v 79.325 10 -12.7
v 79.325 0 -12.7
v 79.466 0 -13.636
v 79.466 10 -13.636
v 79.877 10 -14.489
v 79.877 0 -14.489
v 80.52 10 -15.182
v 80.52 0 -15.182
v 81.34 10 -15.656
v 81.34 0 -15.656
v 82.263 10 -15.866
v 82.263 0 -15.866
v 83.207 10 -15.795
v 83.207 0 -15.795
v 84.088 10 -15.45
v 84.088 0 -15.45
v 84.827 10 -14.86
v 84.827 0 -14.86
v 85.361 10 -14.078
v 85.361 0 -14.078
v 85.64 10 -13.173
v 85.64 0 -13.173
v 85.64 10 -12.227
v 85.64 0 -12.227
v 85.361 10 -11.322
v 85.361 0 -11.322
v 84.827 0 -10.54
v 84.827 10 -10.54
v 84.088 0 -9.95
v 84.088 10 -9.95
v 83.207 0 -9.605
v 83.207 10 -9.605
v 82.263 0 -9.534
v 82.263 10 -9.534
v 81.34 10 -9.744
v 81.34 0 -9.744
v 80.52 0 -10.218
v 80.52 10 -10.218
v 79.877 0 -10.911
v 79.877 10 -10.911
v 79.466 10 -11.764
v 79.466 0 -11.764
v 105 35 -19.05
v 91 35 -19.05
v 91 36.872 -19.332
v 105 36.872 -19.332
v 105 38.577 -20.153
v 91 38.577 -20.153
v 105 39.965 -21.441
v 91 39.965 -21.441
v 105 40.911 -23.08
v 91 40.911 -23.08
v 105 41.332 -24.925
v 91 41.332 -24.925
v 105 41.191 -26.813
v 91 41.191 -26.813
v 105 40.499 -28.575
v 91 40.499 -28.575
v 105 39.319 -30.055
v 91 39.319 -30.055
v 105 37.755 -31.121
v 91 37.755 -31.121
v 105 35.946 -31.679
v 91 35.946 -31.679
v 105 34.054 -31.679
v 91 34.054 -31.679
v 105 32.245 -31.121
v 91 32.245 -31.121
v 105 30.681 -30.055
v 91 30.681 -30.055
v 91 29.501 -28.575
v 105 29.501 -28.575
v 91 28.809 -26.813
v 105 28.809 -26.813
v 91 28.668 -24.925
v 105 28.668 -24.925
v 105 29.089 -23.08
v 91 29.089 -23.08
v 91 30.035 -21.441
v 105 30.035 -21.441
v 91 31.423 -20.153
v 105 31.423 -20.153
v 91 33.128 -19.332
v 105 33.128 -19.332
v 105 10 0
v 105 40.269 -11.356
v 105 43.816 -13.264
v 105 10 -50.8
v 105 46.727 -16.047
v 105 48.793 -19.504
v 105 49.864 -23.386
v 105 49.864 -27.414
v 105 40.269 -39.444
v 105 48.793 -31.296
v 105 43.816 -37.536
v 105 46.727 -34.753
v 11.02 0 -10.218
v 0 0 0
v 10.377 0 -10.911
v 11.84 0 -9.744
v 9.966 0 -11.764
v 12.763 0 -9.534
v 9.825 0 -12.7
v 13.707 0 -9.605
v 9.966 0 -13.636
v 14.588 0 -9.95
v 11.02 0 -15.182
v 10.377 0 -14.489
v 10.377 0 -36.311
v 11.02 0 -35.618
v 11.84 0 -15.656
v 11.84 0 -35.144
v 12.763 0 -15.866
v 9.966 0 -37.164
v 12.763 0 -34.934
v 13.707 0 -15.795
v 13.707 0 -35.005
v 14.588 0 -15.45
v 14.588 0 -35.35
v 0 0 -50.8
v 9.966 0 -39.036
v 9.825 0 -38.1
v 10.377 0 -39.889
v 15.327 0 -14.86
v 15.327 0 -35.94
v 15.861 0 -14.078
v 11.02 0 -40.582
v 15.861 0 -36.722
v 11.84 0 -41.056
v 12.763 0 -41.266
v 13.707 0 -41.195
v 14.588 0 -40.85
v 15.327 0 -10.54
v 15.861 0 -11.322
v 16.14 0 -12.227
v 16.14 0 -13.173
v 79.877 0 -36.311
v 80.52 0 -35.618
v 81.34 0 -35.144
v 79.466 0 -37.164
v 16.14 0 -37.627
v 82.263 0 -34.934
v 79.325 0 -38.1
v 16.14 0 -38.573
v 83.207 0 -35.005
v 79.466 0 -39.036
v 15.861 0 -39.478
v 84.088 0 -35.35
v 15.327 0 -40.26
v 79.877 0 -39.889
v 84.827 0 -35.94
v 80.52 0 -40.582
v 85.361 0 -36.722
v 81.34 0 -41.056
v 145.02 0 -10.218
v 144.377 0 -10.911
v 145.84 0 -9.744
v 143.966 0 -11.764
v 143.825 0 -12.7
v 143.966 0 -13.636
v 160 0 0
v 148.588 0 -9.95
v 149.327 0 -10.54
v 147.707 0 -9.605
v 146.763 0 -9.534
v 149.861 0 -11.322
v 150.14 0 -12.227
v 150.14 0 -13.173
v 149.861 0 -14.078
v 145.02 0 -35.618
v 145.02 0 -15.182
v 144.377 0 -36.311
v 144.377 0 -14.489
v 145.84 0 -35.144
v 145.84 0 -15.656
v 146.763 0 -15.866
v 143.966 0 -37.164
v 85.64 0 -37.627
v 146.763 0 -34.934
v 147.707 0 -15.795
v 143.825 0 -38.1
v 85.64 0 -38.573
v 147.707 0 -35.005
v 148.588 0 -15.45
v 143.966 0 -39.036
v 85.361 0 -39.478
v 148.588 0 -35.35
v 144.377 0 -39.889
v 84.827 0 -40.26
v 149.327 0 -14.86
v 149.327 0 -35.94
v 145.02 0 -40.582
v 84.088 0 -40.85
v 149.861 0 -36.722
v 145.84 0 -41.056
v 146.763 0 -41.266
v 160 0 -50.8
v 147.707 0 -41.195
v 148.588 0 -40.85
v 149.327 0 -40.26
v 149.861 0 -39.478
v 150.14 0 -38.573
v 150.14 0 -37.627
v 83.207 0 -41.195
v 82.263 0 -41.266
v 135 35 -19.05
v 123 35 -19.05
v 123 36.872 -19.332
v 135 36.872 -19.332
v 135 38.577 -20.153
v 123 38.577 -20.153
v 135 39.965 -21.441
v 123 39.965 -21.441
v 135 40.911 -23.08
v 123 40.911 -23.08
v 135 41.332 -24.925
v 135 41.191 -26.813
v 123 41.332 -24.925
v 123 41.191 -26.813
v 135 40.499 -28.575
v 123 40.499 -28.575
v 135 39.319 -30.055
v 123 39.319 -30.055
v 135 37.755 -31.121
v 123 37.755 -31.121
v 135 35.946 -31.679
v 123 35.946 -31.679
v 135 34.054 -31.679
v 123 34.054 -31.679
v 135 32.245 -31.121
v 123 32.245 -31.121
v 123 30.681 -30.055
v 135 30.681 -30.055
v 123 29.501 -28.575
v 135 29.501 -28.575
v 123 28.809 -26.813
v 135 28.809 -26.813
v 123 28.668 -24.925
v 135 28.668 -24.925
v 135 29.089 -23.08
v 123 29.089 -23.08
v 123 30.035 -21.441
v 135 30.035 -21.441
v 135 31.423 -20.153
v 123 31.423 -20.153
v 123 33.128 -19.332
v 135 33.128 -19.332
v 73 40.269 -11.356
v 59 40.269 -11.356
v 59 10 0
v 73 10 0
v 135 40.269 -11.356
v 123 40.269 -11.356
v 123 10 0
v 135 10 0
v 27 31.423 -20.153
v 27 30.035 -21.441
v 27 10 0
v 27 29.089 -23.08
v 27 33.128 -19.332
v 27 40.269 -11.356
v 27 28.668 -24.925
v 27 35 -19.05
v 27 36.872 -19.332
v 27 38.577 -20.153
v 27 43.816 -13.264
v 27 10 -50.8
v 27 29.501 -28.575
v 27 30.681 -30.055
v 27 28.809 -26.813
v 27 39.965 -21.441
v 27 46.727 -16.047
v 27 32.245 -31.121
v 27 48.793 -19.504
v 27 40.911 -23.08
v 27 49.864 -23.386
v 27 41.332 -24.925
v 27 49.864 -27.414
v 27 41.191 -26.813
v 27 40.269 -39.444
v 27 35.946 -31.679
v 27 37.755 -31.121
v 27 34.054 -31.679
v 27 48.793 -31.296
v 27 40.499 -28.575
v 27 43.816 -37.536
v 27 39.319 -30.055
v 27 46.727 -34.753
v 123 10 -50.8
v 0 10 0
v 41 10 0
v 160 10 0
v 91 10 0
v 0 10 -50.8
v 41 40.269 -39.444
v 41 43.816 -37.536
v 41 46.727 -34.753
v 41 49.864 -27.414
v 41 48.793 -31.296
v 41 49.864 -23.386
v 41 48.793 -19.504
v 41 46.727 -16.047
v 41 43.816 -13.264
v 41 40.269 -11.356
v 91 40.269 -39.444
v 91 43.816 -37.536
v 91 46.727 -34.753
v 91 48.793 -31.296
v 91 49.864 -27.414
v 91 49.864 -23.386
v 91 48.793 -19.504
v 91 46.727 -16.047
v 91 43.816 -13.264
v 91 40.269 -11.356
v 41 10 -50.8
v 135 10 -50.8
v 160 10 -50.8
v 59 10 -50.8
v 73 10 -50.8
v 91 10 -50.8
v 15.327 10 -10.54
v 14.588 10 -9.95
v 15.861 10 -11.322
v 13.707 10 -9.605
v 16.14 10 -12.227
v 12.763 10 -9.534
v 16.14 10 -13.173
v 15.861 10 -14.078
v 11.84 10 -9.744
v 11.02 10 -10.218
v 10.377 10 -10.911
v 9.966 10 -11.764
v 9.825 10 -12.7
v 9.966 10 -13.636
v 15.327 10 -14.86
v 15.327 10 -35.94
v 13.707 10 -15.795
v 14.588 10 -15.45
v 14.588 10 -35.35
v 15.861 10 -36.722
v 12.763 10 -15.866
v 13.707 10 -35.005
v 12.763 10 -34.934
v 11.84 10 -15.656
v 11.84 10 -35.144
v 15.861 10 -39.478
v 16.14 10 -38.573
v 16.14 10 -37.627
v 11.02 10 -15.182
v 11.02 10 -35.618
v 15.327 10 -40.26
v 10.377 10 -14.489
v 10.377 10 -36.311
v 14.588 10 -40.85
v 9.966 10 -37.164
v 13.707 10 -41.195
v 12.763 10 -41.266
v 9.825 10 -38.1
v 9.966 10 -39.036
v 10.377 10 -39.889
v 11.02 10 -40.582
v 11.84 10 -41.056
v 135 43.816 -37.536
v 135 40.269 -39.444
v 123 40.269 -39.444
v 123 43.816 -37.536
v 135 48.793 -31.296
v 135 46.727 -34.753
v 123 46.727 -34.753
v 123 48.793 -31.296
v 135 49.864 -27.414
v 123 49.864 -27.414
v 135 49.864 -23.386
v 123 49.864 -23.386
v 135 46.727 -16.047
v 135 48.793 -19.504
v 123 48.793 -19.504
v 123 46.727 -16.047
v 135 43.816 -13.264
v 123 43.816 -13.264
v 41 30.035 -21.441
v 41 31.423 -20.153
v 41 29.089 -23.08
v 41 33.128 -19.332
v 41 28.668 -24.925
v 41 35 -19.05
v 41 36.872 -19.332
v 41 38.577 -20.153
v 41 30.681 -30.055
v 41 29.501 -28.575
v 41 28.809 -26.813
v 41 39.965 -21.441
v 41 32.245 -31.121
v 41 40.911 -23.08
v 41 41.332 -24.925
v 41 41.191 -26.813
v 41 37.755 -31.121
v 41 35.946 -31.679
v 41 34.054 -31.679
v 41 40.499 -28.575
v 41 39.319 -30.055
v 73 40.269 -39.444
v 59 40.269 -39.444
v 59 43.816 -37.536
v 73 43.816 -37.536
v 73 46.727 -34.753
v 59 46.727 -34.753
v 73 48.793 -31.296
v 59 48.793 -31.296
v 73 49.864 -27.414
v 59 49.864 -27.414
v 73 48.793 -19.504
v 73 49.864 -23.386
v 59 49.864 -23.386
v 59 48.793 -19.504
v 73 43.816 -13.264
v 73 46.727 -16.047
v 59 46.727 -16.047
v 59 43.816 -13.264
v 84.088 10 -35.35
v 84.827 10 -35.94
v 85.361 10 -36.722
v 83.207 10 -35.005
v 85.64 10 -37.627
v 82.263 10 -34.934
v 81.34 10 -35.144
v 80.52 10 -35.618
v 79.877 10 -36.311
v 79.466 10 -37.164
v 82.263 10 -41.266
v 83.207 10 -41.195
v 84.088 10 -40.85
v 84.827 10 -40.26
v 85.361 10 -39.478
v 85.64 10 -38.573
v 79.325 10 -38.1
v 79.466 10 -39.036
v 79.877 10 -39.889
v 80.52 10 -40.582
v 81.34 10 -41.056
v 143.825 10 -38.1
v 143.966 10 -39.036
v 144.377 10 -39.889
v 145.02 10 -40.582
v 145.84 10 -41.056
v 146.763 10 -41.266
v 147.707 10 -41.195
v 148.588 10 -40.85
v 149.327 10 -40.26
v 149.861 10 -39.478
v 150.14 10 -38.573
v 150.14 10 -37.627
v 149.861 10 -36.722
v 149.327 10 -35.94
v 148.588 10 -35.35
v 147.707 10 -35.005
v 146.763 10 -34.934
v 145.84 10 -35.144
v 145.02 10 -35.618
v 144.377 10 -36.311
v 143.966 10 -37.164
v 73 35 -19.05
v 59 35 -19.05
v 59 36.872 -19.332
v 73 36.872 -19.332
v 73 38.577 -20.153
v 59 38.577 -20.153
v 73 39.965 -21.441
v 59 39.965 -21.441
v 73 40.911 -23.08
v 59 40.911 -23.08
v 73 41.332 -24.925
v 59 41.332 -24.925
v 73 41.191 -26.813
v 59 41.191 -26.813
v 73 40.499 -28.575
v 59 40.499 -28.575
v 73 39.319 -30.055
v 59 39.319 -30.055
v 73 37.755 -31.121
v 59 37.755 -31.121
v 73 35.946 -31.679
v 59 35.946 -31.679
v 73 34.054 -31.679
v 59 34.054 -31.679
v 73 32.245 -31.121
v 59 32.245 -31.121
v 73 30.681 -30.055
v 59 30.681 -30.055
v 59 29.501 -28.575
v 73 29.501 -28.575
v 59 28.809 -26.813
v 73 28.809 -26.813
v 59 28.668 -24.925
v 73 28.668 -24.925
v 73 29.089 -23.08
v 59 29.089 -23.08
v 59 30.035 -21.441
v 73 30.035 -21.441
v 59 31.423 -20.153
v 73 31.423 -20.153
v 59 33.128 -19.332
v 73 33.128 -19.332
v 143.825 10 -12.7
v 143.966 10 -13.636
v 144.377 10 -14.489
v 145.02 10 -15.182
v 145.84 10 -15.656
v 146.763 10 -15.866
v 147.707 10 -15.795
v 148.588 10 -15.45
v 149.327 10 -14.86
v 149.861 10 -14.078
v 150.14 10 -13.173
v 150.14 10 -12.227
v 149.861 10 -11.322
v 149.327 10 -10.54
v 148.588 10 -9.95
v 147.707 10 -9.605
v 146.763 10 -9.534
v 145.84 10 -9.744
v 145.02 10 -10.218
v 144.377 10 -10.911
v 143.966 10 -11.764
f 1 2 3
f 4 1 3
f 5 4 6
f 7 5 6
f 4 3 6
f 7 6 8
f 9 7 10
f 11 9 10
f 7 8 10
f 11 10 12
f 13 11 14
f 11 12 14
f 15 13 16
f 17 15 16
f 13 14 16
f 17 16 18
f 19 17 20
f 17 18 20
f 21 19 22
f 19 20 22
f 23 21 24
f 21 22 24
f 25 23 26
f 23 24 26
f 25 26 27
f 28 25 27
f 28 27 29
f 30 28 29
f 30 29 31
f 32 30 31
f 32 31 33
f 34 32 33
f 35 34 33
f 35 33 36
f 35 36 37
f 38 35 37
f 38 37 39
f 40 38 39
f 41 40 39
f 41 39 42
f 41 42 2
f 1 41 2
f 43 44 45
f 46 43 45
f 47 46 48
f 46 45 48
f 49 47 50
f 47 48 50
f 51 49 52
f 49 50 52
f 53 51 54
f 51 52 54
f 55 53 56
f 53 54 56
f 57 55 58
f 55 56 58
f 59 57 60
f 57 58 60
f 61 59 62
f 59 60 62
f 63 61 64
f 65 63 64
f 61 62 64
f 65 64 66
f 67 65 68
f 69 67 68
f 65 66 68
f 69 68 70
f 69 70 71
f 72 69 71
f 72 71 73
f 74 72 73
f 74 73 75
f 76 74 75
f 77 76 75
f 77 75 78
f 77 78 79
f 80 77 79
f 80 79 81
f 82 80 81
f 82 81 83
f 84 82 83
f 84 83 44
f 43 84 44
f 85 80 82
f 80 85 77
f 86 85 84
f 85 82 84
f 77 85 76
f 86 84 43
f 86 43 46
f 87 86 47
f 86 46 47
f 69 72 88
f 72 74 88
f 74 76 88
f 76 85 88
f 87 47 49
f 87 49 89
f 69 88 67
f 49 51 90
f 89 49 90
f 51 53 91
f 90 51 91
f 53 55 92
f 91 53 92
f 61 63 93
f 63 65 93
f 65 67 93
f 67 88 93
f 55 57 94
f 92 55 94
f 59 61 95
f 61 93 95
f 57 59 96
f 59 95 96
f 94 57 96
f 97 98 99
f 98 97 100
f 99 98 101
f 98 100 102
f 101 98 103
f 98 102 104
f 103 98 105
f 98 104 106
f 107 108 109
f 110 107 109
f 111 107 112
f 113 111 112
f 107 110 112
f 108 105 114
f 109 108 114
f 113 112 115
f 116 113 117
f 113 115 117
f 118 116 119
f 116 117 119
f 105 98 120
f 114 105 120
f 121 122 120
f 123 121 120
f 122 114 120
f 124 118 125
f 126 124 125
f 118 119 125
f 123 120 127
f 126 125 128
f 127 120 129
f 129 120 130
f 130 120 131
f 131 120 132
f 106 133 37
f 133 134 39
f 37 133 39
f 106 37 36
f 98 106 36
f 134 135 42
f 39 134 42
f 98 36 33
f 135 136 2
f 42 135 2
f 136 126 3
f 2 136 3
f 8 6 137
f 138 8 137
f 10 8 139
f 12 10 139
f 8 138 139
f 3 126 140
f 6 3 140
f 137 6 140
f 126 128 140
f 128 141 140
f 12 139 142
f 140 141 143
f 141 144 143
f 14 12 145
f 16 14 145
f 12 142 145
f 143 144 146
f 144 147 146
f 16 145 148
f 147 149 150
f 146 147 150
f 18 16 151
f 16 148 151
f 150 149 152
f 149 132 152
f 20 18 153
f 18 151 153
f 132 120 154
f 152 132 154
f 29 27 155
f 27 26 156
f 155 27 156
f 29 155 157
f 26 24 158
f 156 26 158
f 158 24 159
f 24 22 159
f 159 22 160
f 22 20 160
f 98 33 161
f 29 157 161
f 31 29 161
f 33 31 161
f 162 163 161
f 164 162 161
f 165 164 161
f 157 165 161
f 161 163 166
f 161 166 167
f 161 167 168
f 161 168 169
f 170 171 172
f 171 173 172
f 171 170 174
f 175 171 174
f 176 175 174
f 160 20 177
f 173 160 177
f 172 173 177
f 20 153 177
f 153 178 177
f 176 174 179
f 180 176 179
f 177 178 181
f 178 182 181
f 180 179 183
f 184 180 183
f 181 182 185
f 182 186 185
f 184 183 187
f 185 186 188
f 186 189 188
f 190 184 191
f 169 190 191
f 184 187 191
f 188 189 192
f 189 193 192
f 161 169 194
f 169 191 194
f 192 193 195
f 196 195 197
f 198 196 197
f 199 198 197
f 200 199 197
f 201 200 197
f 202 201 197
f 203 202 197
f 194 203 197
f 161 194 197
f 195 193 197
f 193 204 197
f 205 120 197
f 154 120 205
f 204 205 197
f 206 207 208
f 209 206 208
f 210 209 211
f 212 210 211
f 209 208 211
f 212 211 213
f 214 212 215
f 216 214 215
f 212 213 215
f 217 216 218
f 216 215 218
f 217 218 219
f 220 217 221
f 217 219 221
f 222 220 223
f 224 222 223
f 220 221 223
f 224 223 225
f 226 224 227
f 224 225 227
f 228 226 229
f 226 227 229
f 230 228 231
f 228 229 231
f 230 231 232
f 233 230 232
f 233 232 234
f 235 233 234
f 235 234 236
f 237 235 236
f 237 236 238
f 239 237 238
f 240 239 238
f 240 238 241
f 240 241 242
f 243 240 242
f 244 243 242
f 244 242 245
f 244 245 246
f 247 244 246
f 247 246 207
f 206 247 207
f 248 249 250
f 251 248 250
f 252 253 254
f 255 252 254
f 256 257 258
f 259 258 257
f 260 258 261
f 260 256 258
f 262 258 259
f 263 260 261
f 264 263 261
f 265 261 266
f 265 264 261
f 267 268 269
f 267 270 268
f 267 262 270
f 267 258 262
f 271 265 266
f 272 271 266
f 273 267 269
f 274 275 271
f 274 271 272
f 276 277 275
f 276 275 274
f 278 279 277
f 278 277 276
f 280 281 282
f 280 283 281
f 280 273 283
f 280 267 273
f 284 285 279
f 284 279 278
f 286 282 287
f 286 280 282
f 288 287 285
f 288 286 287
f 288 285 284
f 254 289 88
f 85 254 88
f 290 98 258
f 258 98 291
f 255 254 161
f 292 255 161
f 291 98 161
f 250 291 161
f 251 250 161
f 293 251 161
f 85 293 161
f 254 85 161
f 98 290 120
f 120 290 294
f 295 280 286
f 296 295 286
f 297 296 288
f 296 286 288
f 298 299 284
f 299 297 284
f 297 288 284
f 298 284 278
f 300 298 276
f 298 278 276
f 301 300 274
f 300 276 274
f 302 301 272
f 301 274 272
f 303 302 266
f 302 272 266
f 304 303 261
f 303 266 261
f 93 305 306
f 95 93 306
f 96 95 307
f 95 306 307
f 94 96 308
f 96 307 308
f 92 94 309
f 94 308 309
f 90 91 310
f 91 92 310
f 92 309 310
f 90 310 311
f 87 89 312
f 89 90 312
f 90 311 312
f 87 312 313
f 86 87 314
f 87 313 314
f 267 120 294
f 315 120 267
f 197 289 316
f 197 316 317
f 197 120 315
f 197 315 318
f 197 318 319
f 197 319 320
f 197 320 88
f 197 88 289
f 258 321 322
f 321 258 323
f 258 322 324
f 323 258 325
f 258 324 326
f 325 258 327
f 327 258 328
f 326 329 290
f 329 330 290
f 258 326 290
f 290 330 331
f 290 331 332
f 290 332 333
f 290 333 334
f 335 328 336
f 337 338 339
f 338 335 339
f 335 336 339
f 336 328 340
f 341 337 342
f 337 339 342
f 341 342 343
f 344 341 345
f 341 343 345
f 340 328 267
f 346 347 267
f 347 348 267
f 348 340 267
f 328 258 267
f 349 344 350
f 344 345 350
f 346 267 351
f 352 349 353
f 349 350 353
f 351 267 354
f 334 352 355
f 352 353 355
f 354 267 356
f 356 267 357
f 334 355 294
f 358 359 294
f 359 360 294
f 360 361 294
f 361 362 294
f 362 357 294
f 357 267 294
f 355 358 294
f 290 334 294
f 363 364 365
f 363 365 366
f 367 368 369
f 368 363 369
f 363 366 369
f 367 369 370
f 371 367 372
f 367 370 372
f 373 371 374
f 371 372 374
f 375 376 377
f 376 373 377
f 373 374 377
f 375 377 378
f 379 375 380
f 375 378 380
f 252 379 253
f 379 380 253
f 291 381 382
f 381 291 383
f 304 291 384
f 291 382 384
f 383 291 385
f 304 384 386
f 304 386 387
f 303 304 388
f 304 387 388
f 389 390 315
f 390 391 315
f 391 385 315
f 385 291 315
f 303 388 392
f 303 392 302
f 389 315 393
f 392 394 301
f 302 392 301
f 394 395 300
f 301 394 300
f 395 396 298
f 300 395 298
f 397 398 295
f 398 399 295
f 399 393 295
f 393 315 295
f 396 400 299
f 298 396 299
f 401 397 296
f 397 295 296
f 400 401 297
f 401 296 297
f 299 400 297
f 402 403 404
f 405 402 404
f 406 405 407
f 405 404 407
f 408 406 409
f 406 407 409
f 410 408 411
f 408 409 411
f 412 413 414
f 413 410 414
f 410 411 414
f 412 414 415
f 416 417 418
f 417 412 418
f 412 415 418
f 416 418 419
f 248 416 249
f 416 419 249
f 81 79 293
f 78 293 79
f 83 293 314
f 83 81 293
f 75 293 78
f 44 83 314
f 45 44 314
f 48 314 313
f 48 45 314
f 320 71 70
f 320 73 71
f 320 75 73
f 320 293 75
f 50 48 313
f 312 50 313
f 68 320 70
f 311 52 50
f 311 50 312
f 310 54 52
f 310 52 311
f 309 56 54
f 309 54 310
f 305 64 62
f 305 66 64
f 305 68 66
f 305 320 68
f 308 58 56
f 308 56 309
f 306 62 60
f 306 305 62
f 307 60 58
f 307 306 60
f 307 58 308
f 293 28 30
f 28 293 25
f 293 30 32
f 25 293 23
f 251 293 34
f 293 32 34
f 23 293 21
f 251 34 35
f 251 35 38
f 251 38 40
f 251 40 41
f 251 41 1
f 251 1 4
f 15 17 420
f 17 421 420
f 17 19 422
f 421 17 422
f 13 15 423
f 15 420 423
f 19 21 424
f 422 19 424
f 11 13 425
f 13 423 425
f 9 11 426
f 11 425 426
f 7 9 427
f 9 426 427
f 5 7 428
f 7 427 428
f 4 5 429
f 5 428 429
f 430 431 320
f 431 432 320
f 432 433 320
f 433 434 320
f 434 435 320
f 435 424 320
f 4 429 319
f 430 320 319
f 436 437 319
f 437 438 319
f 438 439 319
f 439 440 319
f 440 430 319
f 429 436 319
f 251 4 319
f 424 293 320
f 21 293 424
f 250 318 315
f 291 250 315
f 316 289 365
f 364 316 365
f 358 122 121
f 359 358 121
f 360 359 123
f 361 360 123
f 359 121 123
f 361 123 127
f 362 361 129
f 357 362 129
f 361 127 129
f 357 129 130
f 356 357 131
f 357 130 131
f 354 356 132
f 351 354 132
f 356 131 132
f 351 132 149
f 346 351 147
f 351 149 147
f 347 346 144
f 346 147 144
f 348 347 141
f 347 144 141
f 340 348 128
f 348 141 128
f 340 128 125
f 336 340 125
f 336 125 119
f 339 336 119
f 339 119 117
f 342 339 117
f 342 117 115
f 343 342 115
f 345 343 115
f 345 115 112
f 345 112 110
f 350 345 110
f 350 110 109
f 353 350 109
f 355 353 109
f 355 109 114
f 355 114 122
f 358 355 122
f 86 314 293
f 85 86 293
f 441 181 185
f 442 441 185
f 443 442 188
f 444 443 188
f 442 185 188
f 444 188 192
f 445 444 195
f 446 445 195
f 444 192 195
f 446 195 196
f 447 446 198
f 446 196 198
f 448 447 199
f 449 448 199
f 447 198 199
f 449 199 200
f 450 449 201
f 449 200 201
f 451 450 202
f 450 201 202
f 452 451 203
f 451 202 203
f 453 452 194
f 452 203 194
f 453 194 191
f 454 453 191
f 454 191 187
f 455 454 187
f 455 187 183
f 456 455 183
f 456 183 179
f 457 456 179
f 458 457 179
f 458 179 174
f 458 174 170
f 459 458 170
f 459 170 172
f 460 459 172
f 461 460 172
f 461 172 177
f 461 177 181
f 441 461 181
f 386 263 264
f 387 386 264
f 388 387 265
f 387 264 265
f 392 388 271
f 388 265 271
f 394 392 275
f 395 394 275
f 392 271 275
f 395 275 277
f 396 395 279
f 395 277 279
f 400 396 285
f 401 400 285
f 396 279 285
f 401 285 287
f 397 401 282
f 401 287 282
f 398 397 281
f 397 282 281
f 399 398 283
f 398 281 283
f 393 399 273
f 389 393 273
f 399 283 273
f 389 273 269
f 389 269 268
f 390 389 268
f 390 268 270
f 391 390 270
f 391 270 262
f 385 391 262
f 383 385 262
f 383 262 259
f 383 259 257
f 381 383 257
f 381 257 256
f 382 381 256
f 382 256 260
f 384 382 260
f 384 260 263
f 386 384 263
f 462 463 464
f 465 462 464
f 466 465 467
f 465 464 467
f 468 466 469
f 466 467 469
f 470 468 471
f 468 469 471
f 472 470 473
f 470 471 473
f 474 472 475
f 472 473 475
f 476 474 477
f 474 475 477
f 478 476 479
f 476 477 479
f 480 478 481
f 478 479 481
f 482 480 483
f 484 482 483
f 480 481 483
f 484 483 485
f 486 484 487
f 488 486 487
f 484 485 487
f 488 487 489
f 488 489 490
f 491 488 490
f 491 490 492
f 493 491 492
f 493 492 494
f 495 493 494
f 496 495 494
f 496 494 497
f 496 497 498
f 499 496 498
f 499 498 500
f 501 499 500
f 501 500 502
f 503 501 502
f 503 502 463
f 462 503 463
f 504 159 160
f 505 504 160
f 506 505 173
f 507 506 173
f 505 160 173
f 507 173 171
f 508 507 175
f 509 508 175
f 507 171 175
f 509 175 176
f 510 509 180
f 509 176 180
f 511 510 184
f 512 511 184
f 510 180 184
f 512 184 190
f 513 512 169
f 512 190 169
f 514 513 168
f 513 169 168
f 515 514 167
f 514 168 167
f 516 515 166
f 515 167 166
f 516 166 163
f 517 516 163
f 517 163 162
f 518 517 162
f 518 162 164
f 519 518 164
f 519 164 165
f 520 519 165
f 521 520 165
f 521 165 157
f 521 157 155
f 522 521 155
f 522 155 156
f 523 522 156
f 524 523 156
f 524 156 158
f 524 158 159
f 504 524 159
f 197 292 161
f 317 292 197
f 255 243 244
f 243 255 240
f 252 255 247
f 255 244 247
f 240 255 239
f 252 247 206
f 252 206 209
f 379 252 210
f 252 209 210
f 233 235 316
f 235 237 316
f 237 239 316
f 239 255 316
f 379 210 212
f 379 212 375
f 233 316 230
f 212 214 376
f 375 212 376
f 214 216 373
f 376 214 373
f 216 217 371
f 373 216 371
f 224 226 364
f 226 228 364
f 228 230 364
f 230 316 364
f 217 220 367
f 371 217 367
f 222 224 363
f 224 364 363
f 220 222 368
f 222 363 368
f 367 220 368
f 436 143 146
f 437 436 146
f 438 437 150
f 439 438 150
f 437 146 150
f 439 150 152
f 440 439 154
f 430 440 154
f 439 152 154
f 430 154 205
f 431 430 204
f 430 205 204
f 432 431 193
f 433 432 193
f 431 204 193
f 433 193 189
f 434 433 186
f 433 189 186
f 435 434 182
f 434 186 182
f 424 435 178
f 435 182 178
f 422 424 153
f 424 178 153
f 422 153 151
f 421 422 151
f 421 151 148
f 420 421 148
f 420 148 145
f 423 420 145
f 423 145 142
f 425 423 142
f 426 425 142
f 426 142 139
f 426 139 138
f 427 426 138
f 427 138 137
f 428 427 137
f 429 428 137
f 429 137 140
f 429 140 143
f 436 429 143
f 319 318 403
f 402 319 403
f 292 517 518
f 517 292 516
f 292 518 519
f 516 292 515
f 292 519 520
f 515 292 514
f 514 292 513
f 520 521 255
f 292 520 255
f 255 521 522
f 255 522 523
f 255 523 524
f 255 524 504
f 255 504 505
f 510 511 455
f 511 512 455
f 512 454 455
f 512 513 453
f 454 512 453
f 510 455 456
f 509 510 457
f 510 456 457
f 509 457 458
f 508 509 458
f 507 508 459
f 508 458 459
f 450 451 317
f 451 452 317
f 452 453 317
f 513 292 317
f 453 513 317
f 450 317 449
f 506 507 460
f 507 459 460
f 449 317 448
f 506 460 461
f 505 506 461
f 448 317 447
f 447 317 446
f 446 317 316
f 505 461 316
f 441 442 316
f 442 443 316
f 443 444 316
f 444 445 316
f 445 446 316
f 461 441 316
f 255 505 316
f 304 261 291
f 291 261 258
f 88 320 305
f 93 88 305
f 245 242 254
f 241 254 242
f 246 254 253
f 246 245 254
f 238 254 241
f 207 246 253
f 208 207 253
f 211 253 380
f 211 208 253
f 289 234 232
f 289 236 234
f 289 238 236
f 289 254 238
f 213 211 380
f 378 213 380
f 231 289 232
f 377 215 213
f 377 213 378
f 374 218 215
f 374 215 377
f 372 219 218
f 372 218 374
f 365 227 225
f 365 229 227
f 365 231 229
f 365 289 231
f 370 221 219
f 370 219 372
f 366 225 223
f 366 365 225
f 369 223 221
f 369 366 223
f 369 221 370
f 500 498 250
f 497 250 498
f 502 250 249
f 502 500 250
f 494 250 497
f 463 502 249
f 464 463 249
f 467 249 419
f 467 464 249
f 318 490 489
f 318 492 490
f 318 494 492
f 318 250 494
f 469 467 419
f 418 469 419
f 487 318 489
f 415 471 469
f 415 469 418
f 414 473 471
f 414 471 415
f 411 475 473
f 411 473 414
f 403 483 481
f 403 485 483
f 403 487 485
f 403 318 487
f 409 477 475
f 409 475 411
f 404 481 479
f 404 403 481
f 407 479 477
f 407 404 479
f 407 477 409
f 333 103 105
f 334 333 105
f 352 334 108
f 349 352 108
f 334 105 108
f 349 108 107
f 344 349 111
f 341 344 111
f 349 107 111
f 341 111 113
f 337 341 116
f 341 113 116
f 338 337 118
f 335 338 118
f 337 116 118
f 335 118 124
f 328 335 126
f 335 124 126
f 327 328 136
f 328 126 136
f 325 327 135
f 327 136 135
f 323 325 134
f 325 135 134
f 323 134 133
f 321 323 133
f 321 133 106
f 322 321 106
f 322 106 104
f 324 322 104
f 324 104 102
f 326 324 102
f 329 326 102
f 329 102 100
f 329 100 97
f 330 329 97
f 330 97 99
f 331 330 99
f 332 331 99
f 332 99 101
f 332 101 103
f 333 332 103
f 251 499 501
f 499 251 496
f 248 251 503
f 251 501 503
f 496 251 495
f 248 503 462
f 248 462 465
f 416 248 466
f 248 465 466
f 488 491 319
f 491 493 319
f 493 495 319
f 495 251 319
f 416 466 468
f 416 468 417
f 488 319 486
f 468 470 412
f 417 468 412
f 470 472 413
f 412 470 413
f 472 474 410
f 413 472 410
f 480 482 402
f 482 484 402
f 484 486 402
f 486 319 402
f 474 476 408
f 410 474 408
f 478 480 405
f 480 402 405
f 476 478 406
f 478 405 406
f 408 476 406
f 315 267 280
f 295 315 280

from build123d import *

# Parameters (mm, degrees)
SKETCH1_W                 = 160
SKETCH1_H                 = 50.8
BOSS_EXTRUDE1_DEPTH       = 10
SKETCH2_R                 = 6.35
BOSS_EXTRUDE2_DEPTH       = 160
SKETCH3_W                 = 27
SKETCH3_H                 = 40
SKETCH3_W_2               = 18
SKETCH3_W_3               = 25
CUT_EXTRUDE2_DEPTH        = 176.158899289
F_4_0_25_DIAMETER_HOLE1_D = 6.35


with BuildPart() as part:
    # Sketch1 → Boss-Extrude1 (new body)
    with BuildSketch(Plane(origin=(0, 0, 0), x_dir=(1, 0, 0), z_dir=(0, 1, 0))):
        with Locations((80, 25.4)):
            Rectangle(SKETCH1_W, SKETCH1_H)
    extrude(amount=BOSS_EXTRUDE1_DEPTH)

    # Sketch2 → Boss-Extrude2 (add, through all)
    with BuildSketch(Plane.ZY):
        with BuildLine():
            Line((-50.8, 10), (-39.444175854, 40.268882668))
            ThreePointArc((-39.444175854, 40.268882668), (-25.4, 50), (-11.355824146, 40.268882668))
            Line((-11.355824146, 40.268882668), (0, 10))
            Line((0, 10), (-50.8, 10))
        make_face()
        with Locations((-25.4, 35)):
            Circle(SKETCH2_R, mode=Mode.SUBTRACT)
    extrude(amount=-BOSS_EXTRUDE2_DEPTH)

    # Sketch3 → Cut-Extrude2 (cut, through all)
    with BuildSketch(Plane(origin=(0, 0, -50.8), x_dir=(-1, 0, 0), z_dir=(0, 0, -1))):
        with Locations((-13.5, 30)):
            Rectangle(SKETCH3_W, SKETCH3_H)
        with Locations((-50, 30)):
            Rectangle(SKETCH3_W_2, SKETCH3_H)
        with Locations((-82, 30)):
            Rectangle(SKETCH3_W_2, SKETCH3_H)
        with Locations((-114, 30)):
            Rectangle(SKETCH3_W_2, SKETCH3_H)
        with Locations((-147.5, 30)):
            Rectangle(SKETCH3_W_3, SKETCH3_H)
    extrude(amount=-CUT_EXTRUDE2_DEPTH, mode=Mode.SUBTRACT)

    # #4 (0.25) Diameter Hole1 (through all)
    with Locations(Plane(origin=(0, 10, 0), x_dir=(1, 0, 0), z_dir=(0, 1, 0))):
        with Locations((82.5, 38.1), (82.5, 12.7), (147, 12.7), (147, 38.1), (13, 38.1), (13, 12.7)):
            Hole(F_4_0_25_DIAMETER_HOLE1_D / 2)


solid = part.part
